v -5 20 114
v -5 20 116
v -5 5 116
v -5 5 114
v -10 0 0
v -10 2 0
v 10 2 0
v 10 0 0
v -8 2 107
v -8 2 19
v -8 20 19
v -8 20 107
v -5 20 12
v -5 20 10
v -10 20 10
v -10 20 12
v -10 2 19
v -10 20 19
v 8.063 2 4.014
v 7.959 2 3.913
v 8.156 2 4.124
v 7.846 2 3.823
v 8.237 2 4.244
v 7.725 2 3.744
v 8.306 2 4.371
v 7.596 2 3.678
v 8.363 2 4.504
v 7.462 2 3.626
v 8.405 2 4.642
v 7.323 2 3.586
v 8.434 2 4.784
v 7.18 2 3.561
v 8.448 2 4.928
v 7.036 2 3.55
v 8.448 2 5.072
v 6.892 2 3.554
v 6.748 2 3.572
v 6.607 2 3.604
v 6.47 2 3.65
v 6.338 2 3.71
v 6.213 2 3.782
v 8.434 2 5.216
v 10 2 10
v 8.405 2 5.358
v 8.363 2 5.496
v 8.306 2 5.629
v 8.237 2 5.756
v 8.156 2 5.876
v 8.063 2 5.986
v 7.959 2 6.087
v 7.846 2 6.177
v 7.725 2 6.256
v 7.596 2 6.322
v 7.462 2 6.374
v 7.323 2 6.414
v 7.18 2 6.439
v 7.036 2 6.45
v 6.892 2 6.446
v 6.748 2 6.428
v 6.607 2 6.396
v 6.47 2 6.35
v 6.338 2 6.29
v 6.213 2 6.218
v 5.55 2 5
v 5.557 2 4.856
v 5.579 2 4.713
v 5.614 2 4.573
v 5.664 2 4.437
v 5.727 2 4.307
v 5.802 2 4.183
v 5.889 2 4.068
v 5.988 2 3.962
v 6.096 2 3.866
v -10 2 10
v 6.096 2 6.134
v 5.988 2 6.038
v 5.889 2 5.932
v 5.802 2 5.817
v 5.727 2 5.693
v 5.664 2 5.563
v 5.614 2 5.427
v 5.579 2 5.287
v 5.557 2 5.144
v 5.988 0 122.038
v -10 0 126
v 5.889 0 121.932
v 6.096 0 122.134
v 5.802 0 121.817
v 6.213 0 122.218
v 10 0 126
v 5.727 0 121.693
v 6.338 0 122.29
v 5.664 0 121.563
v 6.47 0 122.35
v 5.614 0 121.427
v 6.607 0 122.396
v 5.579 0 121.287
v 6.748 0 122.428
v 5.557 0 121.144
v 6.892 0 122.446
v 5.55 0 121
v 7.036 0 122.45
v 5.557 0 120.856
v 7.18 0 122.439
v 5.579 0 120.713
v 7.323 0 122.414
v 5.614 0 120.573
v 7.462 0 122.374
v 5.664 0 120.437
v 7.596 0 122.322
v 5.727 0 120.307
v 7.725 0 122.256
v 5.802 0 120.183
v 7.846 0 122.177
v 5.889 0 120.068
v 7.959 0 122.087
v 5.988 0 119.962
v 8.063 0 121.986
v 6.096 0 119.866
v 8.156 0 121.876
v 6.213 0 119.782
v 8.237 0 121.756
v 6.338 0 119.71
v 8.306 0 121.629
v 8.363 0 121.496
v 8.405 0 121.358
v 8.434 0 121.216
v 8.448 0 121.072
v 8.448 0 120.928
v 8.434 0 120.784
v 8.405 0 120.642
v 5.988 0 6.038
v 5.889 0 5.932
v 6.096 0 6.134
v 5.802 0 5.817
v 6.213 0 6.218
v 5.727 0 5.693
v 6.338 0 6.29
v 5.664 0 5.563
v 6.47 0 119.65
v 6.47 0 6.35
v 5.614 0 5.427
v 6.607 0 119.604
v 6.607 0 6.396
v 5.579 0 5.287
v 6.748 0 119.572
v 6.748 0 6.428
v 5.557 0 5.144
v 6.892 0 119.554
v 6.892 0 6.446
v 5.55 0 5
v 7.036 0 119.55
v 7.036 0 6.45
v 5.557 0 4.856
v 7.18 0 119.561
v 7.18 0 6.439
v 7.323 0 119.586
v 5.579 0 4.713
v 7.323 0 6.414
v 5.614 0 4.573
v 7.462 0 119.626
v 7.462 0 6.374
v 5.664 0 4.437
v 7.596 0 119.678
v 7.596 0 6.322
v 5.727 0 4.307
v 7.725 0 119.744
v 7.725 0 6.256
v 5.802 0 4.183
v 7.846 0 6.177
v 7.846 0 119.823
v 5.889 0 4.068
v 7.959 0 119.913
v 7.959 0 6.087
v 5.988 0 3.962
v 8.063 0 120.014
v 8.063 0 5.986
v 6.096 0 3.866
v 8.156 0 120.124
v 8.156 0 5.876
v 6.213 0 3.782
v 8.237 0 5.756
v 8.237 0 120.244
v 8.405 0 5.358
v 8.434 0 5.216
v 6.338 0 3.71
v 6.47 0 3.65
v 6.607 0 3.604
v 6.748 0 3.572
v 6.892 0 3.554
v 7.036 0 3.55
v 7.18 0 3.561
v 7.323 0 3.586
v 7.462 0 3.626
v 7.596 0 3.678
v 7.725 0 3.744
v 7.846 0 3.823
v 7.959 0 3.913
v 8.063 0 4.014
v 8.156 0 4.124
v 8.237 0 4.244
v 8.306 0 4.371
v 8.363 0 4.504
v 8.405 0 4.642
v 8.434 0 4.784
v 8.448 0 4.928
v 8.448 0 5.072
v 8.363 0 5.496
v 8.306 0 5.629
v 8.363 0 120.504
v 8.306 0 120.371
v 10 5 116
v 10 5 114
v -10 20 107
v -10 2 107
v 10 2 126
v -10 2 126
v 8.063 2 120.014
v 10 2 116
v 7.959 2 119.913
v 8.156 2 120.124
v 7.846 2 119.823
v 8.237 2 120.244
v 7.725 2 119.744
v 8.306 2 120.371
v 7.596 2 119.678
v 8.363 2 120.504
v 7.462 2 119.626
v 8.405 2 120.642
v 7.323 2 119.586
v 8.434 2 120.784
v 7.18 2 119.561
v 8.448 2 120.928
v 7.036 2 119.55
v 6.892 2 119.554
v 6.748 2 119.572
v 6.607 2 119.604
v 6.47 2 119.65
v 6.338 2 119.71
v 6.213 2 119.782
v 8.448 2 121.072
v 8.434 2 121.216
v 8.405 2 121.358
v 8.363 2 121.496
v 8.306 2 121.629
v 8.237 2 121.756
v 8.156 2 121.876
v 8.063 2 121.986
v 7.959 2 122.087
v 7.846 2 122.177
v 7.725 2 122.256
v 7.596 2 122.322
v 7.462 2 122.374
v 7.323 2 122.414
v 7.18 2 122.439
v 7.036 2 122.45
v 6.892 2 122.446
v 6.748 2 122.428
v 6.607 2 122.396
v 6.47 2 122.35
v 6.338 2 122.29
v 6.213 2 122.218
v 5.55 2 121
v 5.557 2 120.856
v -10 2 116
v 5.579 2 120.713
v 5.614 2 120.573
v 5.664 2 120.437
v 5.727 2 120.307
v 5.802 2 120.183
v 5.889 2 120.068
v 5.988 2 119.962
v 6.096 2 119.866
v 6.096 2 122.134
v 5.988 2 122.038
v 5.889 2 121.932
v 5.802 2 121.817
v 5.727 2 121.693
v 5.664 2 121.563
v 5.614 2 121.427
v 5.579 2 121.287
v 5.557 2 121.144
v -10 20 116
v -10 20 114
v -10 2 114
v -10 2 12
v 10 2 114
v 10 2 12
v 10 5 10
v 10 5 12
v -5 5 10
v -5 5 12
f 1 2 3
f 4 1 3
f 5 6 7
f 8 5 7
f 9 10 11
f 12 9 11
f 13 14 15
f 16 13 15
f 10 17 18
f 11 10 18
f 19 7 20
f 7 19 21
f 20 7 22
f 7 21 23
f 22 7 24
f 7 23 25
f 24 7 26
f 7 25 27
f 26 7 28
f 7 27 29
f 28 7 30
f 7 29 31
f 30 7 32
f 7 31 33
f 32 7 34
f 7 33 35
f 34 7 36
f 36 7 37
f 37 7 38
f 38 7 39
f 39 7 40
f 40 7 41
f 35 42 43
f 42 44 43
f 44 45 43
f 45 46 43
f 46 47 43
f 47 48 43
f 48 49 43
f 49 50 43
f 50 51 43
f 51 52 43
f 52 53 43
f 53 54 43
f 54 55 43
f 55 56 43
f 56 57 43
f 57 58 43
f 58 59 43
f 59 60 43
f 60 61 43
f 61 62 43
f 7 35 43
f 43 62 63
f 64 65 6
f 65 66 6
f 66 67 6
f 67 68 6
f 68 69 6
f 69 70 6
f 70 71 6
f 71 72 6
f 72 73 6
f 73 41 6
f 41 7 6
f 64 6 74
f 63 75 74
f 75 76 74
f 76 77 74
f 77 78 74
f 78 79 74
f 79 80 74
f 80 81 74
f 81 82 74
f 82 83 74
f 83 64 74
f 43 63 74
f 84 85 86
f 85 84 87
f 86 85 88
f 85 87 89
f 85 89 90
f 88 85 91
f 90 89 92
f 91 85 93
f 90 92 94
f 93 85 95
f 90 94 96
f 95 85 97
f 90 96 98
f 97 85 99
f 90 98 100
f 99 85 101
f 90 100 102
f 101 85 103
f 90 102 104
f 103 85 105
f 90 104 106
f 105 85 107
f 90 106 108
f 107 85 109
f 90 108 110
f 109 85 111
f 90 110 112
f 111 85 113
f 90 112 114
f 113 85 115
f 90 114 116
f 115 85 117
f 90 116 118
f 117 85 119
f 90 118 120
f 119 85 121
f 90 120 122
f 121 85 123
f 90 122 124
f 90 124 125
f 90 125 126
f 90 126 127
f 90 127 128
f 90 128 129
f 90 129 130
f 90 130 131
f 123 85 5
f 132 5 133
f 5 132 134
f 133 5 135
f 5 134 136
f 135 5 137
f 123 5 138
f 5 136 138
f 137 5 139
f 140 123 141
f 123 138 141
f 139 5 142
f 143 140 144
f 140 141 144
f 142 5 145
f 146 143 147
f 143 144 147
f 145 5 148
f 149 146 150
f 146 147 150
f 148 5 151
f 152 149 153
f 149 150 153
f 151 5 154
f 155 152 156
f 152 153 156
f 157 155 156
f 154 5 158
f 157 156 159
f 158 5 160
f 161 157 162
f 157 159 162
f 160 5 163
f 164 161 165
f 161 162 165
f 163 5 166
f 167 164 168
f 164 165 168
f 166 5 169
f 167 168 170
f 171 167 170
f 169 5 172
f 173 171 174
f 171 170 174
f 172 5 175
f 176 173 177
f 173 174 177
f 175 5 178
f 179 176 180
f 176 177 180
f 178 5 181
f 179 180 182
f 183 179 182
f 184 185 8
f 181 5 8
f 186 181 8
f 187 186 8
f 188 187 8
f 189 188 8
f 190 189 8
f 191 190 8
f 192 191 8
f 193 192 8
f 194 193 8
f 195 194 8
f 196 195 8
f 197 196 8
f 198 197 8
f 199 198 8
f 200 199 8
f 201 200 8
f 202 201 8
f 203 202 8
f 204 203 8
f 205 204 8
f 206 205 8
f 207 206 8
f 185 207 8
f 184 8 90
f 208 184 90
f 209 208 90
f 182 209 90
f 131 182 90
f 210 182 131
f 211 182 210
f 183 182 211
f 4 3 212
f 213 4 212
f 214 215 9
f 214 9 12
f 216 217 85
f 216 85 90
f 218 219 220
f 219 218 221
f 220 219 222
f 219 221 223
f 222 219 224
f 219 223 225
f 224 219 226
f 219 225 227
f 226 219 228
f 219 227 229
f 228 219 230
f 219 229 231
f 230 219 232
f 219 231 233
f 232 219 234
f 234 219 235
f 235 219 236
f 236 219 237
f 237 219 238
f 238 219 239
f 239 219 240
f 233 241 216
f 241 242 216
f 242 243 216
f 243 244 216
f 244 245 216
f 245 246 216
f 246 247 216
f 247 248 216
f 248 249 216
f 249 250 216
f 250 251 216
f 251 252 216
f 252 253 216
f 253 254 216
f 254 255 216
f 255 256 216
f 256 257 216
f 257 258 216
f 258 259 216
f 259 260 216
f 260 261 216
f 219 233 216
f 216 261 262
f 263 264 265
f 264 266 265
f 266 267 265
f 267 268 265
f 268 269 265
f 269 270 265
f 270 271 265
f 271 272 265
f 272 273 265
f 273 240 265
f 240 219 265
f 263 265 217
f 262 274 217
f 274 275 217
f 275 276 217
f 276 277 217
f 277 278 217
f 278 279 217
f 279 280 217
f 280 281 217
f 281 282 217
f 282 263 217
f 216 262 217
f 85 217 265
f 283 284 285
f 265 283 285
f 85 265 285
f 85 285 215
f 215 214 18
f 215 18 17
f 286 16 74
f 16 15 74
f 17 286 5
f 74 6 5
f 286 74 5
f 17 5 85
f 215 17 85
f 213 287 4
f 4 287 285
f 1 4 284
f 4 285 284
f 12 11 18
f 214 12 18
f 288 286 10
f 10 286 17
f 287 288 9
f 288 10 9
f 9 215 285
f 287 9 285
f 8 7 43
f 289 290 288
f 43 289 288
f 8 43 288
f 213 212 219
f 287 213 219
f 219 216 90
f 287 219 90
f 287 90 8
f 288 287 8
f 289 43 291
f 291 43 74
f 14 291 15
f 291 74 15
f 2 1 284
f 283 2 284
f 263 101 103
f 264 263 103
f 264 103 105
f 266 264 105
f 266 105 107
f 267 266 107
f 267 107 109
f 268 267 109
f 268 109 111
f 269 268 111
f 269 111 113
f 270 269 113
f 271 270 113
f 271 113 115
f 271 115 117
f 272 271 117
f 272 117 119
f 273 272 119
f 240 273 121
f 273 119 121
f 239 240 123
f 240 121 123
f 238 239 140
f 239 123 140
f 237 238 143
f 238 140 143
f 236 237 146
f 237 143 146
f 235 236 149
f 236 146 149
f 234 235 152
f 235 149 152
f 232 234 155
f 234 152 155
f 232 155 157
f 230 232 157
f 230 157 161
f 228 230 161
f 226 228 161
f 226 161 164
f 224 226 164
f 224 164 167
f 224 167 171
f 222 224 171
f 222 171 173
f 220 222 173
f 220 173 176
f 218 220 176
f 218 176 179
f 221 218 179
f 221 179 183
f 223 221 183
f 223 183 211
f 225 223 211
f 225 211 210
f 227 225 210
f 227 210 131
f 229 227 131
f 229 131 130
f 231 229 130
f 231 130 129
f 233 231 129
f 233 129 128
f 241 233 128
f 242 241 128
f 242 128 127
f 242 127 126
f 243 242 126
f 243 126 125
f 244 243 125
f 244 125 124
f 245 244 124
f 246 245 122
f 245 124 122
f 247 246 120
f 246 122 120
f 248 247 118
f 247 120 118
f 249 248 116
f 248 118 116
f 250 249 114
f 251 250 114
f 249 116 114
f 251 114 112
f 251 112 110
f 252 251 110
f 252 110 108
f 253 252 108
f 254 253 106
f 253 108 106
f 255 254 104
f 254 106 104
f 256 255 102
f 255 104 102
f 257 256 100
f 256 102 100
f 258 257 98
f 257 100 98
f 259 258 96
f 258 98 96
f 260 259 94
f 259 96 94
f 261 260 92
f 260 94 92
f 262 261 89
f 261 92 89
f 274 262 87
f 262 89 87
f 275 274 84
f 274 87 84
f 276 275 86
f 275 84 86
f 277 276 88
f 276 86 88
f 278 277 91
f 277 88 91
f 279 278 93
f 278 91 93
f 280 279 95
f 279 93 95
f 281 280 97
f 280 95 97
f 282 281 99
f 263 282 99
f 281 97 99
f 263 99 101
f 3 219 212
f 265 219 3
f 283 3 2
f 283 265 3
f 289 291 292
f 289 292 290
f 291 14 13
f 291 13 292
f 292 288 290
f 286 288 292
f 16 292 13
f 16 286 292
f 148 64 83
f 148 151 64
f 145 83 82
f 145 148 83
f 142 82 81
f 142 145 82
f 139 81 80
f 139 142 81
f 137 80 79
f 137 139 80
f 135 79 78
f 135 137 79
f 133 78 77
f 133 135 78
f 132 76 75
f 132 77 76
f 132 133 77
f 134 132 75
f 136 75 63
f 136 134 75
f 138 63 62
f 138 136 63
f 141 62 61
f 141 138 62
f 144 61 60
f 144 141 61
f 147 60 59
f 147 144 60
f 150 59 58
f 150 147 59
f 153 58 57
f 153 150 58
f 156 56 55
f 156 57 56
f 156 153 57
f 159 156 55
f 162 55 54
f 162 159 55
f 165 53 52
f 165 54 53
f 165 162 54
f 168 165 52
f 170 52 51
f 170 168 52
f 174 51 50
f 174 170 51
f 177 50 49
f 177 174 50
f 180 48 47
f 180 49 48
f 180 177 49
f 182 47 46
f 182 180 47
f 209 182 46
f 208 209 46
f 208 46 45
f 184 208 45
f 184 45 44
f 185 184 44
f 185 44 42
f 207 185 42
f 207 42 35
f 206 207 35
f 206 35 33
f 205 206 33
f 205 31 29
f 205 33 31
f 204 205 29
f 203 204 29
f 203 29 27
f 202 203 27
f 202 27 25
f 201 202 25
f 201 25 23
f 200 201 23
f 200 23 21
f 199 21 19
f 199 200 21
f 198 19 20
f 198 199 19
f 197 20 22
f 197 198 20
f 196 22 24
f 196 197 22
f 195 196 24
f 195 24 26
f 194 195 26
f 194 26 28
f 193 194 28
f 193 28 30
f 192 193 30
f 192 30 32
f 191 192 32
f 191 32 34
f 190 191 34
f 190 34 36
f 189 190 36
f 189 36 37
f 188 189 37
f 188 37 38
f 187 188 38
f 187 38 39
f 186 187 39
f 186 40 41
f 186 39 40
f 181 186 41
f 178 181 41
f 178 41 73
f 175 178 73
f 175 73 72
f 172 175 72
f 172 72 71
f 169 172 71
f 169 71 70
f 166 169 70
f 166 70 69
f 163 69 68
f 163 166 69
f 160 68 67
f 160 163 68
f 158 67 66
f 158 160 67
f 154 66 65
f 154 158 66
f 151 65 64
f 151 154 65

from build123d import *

# Parameters (mm, degrees)
BOSS_EXTRUDE1_DEPTH    = 126
SKETCH2_W              = 7
SKETCH2_H              = 18
SKETCH2_W_2            = 10
CUT_EXTRUDE1_DEPTH     = 130.135587659
BOSS_EXTRUDE2_DEPTH    = 2
M2_5_CLEARANCE_HOLE1_D = 2.9


with BuildPart() as part:
    # Sketch1 → Boss-Extrude1 (new body)
    with BuildSketch(Plane.XY):
        Polygon((-10, 0), (10, 0), (10, 2), (-8, 2), (-8, 20), (-10, 20), align=None)
    extrude(amount=BOSS_EXTRUDE1_DEPTH)

    # Sketch2 → Cut-Extrude1 (cut, through all)
    with BuildSketch(Plane.ZY.offset(10)):
        with Locations((15.5, 11)):
            Rectangle(SKETCH2_W, SKETCH2_H)
        with Locations((110.5, 11)):
            Rectangle(SKETCH2_W, SKETCH2_H)
        with Locations((5, 11)):
            Rectangle(SKETCH2_W_2, SKETCH2_H)
        with Locations((121, 11)):
            Rectangle(SKETCH2_W_2, SKETCH2_H)
    extrude(amount=-CUT_EXTRUDE1_DEPTH, mode=Mode.SUBTRACT)

    # Sketch3 → Boss-Extrude2 (add)
    with BuildSketch(Plane.XY.offset(116)):
        Polygon((-10, 20), (-5, 20), (-5, 5), (10, 5), (10, 2), (-5, 2), (-10, 2), align=None)
    boss_extrude2 = extrude(amount=-BOSS_EXTRUDE2_DEPTH)

    # M2.5 Clearance Hole1 (through all)
    with Locations(Plane(origin=(0, 2, 0), x_dir=(1, 0, 0), z_dir=(0, 1, 0))):
        with Locations((7, -121)):
            m2_5_clearance_hole1 = Hole(M2_5_CLEARANCE_HOLE1_D / 2)

    # Mirror1: Boss-Extrude2, M2.5 Clearance Hole1 across plane
    add(boss_extrude2.mirror(Plane.XY.offset(63)))
    add(m2_5_clearance_hole1.mirror(Plane.XY.offset(63)), mode=Mode.SUBTRACT)


solid = part.part
